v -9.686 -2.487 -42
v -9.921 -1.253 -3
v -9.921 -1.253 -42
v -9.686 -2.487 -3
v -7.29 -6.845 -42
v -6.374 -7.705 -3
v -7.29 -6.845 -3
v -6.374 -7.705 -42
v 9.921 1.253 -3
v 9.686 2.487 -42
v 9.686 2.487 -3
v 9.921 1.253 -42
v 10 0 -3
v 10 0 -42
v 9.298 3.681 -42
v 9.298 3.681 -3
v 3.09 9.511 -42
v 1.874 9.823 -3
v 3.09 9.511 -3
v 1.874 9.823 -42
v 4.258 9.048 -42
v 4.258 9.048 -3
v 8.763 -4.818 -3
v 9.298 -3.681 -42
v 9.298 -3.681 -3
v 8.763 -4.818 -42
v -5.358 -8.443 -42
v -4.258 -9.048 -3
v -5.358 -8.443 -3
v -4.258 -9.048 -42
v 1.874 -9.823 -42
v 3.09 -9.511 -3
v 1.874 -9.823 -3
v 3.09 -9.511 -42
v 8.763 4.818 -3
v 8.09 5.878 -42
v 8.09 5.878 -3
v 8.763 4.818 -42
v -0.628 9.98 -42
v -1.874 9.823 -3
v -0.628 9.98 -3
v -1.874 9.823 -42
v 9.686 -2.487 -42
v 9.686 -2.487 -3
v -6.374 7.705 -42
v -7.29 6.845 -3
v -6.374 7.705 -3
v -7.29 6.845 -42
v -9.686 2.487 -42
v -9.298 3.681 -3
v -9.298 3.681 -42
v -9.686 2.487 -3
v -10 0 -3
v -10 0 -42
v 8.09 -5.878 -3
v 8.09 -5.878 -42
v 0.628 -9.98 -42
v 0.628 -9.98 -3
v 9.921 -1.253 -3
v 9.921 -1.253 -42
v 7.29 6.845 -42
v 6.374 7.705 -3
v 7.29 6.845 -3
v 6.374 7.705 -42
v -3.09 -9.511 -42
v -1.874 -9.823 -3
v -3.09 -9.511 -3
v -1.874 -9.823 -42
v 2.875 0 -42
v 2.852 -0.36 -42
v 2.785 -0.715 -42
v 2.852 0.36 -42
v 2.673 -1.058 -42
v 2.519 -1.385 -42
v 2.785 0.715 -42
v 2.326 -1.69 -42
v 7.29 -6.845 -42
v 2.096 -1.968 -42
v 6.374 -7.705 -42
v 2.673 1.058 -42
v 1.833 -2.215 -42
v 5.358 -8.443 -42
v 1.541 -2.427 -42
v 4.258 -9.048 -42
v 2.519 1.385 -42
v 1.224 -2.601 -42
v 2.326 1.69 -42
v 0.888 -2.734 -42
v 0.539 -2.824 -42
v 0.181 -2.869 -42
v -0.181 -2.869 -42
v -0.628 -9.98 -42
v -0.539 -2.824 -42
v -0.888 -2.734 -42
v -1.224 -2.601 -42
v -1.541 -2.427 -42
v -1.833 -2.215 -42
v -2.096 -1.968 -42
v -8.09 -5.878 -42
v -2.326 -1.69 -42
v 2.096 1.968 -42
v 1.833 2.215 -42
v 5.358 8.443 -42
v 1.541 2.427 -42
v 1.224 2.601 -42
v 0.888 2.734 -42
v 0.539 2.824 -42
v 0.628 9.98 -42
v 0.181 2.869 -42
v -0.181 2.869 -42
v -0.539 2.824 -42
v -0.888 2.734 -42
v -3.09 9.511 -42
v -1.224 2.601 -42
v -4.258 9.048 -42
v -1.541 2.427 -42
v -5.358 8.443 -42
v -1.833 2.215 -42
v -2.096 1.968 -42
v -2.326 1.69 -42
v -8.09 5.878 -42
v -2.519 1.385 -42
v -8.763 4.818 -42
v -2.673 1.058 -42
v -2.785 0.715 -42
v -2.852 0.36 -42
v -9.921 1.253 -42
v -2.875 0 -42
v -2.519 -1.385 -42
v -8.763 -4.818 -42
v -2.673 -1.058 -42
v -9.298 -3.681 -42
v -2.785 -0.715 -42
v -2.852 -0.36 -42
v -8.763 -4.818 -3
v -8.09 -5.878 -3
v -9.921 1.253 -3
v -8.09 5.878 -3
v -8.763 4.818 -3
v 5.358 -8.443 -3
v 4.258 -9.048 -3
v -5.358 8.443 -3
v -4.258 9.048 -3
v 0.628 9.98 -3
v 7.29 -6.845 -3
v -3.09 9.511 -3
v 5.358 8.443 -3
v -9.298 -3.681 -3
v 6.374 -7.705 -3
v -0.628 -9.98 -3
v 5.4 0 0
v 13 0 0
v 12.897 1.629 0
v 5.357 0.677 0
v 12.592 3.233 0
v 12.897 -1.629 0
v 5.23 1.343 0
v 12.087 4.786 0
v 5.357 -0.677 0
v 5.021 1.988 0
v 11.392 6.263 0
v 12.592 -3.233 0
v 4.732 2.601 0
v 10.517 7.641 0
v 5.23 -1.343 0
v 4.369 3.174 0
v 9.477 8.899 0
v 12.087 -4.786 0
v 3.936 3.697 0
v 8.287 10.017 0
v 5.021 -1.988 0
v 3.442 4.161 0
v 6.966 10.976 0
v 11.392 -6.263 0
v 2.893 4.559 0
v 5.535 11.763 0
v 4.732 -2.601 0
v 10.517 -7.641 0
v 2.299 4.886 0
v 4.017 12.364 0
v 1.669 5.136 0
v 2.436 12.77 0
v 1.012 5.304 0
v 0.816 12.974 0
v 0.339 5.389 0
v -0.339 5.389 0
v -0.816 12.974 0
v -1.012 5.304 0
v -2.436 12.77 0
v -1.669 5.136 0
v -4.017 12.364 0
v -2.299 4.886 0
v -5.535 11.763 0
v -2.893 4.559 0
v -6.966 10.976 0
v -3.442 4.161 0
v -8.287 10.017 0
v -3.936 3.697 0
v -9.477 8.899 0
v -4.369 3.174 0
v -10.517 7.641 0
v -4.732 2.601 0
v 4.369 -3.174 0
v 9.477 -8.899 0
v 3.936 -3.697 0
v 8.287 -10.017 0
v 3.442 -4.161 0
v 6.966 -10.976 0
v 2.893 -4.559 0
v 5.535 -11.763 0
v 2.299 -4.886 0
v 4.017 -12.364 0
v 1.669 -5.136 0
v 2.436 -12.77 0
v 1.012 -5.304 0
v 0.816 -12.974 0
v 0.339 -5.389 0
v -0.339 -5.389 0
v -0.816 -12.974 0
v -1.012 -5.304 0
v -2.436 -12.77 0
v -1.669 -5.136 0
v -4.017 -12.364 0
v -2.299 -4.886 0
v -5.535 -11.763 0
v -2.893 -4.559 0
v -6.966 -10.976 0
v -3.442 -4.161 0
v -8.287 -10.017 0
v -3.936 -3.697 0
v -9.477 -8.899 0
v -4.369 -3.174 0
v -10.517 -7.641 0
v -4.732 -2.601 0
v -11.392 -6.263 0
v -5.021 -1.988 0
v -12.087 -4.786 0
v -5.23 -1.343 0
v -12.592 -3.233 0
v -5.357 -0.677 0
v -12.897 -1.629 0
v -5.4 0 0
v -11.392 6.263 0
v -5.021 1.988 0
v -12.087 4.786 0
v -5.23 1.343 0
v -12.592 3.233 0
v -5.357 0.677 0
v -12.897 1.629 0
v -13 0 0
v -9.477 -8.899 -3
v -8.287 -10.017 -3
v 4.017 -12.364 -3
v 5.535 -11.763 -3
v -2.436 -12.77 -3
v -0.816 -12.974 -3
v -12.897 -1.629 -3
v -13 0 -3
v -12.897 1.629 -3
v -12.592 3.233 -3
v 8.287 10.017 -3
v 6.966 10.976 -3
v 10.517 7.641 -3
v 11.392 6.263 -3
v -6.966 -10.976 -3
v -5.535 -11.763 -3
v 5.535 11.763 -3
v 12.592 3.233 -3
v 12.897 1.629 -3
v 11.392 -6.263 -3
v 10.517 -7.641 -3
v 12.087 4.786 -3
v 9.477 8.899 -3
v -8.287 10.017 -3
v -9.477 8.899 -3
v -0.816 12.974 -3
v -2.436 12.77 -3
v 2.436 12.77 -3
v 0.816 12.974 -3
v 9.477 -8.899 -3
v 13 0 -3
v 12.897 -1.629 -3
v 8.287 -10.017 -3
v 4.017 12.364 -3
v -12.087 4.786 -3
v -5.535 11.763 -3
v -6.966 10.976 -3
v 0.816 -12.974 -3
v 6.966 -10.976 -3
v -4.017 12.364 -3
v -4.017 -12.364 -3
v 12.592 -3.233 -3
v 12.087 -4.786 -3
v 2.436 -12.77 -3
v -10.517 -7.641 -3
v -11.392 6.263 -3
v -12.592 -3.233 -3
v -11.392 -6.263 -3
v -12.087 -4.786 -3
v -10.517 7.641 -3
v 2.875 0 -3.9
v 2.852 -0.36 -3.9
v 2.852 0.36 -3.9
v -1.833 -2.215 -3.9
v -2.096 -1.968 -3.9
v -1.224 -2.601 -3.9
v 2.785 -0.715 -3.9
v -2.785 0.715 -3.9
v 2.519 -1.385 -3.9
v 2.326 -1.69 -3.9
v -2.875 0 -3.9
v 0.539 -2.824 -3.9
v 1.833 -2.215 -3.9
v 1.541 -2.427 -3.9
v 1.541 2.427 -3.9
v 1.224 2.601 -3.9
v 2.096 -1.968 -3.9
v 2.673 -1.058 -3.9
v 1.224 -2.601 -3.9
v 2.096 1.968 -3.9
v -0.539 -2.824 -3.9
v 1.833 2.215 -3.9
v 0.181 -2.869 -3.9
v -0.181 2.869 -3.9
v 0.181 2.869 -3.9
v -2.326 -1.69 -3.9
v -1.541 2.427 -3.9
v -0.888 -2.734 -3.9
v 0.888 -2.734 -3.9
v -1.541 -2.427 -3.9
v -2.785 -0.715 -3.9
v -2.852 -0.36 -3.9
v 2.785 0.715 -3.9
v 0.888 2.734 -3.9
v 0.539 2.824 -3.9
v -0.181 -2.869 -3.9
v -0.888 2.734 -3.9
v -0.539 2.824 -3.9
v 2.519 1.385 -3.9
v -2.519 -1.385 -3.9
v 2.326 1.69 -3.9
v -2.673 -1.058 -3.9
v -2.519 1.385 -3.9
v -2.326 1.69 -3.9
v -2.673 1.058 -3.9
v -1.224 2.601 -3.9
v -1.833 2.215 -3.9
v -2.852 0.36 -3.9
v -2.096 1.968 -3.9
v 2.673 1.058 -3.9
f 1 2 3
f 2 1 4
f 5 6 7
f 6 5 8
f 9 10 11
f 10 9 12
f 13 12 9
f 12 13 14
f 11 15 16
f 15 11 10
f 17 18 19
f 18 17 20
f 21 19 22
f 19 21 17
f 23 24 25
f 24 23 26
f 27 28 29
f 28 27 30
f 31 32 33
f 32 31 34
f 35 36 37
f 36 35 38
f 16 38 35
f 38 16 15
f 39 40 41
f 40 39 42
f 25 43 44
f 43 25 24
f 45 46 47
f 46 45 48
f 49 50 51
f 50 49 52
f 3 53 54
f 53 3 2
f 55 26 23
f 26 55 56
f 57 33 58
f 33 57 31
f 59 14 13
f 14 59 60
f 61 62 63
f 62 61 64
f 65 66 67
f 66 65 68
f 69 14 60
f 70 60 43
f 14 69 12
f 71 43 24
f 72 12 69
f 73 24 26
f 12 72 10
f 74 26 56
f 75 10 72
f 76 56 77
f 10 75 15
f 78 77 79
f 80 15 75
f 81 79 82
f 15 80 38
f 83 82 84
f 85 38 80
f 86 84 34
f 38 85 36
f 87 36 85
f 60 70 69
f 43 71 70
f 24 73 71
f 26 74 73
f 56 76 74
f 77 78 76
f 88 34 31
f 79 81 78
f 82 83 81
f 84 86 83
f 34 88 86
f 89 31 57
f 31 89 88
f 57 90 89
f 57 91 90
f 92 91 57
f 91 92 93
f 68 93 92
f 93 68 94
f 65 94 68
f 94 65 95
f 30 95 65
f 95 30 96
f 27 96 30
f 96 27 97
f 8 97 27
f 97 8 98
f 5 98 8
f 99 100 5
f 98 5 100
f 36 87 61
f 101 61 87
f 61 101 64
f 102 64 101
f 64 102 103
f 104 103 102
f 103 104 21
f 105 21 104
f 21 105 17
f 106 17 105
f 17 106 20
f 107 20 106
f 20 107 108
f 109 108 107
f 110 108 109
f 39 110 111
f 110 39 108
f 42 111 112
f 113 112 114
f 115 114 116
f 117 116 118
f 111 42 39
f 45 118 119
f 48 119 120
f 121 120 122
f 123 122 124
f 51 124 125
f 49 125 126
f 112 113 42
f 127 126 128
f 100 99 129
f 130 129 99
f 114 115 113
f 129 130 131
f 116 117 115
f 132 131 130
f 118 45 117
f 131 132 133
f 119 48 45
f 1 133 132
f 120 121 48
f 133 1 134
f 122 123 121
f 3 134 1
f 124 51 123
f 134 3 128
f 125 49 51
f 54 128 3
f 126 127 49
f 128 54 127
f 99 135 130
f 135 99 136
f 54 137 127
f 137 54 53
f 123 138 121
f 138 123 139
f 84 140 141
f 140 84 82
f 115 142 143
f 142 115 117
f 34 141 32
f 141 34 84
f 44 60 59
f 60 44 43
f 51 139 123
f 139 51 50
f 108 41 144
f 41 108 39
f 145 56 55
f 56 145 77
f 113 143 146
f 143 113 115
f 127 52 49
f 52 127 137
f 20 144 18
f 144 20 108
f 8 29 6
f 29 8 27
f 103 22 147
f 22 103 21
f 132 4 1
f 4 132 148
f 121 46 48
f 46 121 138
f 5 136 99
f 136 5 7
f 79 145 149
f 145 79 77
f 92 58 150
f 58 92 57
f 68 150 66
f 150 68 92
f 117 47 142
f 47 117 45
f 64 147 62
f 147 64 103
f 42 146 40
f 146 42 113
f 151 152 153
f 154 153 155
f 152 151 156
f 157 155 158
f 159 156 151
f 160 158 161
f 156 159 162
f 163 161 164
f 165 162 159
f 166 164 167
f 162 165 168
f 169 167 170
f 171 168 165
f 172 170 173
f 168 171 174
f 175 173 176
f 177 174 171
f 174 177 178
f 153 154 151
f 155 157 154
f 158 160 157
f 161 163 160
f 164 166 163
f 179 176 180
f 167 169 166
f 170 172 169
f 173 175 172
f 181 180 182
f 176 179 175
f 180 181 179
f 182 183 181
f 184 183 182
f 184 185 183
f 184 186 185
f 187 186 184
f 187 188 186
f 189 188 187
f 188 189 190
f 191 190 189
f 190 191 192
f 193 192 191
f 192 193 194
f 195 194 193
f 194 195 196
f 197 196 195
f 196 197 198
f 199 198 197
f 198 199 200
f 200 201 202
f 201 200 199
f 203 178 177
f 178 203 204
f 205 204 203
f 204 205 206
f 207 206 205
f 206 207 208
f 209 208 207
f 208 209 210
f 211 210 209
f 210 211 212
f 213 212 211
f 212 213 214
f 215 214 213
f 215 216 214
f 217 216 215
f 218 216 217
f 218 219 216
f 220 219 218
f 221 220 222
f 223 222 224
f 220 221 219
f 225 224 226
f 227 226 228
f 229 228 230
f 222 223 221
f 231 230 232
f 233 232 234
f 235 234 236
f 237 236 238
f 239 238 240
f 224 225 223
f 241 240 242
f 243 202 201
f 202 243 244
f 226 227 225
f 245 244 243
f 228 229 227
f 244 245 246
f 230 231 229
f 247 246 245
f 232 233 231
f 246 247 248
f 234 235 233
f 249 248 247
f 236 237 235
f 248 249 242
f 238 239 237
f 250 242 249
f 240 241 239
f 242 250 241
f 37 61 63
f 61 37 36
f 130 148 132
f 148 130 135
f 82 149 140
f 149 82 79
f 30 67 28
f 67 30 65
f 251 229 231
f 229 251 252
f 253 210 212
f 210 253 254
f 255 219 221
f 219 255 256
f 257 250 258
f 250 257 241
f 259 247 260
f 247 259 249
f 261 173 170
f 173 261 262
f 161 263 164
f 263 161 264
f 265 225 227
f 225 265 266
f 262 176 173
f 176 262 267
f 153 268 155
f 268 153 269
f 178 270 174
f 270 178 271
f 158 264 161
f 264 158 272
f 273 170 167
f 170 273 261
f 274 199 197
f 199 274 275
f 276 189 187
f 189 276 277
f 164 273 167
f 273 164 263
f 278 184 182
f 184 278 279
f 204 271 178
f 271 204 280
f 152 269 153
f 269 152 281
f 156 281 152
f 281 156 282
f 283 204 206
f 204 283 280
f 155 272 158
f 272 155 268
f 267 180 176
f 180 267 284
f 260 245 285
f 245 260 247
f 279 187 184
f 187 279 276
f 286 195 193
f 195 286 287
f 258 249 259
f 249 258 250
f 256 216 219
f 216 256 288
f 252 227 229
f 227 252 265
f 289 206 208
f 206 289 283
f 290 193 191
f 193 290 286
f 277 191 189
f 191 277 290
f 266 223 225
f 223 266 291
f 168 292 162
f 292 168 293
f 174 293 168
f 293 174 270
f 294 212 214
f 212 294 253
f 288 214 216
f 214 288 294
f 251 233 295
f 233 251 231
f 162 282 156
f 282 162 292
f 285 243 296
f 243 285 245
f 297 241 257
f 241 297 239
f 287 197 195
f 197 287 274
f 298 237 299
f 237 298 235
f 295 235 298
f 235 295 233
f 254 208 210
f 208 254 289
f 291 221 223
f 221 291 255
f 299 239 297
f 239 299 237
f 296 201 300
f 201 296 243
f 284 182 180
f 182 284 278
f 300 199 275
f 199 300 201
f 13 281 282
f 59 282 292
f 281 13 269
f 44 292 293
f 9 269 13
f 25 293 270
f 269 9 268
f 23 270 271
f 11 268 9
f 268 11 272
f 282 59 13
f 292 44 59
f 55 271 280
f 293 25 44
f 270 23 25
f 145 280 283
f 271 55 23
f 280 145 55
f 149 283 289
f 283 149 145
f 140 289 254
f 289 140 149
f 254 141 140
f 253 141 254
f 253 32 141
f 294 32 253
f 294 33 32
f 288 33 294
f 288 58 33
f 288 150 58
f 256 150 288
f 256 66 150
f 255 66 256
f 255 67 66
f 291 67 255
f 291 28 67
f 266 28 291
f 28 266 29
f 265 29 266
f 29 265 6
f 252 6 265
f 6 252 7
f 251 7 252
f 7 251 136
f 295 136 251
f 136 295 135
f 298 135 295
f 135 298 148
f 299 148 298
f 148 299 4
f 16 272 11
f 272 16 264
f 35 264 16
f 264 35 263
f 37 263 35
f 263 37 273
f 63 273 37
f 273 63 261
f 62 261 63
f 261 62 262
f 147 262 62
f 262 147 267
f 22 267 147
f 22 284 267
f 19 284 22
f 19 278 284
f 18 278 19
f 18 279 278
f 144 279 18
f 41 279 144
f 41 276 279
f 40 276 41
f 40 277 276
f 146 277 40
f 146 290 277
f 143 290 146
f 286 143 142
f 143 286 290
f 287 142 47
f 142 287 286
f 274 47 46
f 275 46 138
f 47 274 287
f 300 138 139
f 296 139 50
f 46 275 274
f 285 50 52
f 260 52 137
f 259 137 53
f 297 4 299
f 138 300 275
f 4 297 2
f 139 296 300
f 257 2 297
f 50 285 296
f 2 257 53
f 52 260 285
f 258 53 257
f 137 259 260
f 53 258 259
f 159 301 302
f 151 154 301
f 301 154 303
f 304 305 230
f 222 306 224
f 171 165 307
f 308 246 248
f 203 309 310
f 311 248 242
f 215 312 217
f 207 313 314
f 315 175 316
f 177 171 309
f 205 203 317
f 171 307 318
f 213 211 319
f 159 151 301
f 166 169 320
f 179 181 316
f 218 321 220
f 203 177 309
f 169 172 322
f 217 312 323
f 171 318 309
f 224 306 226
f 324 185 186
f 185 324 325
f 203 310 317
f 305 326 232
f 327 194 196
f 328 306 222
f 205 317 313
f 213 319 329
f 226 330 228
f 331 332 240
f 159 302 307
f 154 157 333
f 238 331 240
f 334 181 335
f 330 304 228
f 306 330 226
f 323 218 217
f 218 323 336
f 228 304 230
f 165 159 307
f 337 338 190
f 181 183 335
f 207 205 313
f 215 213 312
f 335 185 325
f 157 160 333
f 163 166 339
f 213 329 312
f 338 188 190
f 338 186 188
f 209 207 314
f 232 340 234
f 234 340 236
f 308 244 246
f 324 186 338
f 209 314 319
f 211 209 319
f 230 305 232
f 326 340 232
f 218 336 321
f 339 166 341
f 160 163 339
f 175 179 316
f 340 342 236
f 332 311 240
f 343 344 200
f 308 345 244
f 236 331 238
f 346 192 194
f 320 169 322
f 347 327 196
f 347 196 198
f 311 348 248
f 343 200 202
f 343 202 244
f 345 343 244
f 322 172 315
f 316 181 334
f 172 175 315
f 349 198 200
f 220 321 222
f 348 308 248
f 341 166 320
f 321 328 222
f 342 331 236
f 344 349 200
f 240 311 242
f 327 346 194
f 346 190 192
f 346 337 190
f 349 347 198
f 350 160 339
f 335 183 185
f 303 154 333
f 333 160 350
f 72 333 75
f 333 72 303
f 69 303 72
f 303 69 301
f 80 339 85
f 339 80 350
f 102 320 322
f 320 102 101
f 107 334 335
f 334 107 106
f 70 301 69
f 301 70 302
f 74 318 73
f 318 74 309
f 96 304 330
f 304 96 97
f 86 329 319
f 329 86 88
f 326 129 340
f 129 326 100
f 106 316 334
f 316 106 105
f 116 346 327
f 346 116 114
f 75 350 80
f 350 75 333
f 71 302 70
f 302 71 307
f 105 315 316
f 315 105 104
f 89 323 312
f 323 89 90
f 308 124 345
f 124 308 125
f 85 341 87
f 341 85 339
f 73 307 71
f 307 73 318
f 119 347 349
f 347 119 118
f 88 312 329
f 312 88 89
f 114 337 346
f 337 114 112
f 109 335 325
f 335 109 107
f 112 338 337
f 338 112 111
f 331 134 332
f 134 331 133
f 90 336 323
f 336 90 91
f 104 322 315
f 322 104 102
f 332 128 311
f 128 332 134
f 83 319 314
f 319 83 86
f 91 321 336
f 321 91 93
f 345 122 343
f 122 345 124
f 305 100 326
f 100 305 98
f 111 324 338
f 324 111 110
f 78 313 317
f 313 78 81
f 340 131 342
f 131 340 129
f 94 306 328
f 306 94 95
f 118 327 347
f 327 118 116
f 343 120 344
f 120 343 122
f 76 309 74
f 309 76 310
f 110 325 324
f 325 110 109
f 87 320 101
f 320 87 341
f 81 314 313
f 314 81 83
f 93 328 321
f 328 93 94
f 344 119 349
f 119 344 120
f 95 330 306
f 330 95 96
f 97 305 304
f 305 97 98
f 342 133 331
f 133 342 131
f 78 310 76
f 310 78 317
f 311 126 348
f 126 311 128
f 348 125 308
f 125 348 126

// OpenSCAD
$fn = 50;


difference() {
	union() {
		translate(v = [0, 0, -42.0000000000]) {
			cylinder(h = 42, r = 10.0000000000);
		}
		translate(v = [0, 0, -3.0000000000]) {
			cylinder(h = 3, r = 13.0000000000);
		}
	}
	union() {
		translate(v = [0, 0, 0]) {
			rotate(a = [0, 0, 0]) {
				difference() {
					union() {
						#translate(v = [0, 0, -42.0000000000]) {
							cylinder(h = 42, r = 2.6000000000);
						}
						#translate(v = [0, 0, -3.9000000000]) {
							cylinder(h = 3.9000000000, r1 = 2.8750000000, r2 = 5.4000000000);
						}
						#translate(v = [0, 0, -42.0000000000]) {
							cylinder(h = 42, r = 2.8750000000);
						}
						#translate(v = [0, 0, -42.0000000000]) {
							cylinder(h = 42, r = 2.6000000000);
						}
					}
					union();
				}
			}
		}
	}
}
